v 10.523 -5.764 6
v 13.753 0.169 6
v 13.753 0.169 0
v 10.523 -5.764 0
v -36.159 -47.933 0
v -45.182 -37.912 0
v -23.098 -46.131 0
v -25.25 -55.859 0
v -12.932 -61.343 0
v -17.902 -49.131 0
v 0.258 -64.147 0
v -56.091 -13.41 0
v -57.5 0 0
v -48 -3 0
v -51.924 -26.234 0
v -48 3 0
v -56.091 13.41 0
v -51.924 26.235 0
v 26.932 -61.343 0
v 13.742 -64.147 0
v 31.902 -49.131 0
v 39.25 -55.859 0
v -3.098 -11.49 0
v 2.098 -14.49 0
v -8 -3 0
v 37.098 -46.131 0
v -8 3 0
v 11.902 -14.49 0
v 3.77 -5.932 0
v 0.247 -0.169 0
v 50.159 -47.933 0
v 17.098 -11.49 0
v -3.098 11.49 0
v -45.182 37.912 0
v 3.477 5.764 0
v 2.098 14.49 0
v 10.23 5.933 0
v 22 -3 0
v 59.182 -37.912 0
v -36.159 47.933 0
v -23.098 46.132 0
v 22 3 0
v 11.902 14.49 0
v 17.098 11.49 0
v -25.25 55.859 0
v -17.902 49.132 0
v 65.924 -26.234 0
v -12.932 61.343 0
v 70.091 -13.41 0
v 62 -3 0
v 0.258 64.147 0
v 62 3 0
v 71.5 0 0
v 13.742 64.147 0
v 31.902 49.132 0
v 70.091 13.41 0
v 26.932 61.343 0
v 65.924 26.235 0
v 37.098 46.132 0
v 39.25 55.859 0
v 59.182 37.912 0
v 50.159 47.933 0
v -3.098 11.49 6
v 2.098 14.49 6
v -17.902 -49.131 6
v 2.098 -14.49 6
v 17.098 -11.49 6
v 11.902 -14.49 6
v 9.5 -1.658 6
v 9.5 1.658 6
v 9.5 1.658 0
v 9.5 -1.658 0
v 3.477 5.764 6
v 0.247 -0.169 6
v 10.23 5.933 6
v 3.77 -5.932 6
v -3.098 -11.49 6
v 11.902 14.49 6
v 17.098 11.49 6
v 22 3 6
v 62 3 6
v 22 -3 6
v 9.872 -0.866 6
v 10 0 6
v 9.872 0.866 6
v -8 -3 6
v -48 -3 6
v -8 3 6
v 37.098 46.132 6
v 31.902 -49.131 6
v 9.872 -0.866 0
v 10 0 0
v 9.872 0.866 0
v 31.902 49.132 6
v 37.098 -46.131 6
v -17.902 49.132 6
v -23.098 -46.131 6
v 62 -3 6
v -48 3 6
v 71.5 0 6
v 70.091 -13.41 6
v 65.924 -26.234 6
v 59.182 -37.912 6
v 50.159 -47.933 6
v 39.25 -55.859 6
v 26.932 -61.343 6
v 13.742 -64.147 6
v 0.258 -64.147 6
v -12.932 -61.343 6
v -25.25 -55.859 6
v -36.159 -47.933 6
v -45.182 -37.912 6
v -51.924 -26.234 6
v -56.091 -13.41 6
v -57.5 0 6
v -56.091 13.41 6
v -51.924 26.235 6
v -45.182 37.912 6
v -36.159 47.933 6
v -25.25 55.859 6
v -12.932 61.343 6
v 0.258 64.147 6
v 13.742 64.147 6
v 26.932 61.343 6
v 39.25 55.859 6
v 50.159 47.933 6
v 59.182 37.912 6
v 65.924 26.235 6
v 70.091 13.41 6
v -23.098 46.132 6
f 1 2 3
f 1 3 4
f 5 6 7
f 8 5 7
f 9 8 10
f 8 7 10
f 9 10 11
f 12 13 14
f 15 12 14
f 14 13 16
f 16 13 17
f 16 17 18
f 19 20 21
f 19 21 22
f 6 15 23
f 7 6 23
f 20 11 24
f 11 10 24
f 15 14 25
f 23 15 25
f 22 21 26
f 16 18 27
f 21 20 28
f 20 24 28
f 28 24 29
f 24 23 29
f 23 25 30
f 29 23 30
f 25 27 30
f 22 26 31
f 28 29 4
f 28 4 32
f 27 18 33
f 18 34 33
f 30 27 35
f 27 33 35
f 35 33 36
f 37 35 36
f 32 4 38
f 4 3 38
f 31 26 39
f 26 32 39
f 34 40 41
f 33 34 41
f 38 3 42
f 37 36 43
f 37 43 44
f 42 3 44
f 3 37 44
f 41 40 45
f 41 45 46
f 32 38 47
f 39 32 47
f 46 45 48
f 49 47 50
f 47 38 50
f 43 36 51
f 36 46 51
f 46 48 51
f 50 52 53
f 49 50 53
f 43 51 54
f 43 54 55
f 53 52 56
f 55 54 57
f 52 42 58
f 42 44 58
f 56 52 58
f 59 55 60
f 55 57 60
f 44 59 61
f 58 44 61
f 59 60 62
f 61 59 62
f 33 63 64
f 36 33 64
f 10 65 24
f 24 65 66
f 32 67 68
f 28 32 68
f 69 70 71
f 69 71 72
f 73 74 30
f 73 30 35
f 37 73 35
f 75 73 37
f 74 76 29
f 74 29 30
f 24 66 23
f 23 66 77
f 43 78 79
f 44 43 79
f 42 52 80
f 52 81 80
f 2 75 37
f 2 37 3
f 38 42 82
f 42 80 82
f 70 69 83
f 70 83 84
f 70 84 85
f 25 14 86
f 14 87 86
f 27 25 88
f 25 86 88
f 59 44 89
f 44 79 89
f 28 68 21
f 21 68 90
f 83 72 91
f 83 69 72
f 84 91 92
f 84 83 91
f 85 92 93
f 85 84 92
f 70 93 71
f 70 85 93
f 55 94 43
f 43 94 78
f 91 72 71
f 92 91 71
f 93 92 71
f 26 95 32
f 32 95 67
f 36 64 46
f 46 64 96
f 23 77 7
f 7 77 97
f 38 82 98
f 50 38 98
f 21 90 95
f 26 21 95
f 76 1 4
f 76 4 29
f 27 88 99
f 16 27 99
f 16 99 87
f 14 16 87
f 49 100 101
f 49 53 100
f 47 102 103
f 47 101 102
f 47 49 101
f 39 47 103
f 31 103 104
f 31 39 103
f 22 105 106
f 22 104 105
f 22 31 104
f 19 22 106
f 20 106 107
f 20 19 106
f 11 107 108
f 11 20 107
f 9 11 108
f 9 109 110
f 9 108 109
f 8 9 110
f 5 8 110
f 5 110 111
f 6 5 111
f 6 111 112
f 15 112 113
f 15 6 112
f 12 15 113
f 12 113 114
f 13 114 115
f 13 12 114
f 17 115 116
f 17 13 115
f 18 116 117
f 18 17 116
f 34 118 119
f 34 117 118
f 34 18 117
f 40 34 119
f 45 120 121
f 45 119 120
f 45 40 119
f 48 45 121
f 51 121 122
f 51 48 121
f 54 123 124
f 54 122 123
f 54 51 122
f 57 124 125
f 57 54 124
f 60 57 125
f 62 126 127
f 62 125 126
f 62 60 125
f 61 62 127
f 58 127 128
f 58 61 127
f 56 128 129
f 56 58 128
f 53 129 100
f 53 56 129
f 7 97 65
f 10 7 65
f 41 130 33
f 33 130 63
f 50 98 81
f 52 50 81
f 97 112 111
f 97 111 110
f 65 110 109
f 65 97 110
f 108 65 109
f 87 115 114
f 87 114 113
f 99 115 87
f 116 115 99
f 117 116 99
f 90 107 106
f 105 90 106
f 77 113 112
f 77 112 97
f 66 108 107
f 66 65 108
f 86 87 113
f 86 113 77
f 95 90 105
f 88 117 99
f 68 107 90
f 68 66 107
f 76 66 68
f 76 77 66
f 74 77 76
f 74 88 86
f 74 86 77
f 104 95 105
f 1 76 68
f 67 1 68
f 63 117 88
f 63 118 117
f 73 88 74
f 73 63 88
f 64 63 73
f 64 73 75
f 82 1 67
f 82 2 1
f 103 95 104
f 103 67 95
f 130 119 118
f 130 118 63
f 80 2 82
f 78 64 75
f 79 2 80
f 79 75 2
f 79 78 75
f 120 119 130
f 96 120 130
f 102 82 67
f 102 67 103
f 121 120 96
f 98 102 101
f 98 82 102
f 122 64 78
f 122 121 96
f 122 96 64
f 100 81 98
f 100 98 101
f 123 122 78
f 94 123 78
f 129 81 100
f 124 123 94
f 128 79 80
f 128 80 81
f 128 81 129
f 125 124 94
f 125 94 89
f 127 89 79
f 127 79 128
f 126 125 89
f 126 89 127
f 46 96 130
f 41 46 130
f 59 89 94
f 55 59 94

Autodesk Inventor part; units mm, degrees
ref_plane "YZ Plane" through (0, 0, 0) normal (1, 0, 0) x (0, 1, 0)
ref_plane "XZ Plane" through (0, 0, 0) normal (0, 1, 0) x (-1, 0, 0)
ref_plane "XY Plane" through (0, 0, 0) normal (0, 0, 1) x (1, 0, 0)
sketch "Эскиз1" plane through (0, 0, 0) normal (0, 0, 1) x (1, 0, 0)
  circle A0 centre (7, 0.0001) radius 3 projected
  circle A1 centre (7, 0.0001) radius 64.5
  point P0 (0, 0)
  dimension "d0" = 129
extrude "Выдавливание1" add sketch "Эскиз1" along normal blind 6
sketch "Эскиз2" plane through (7, 0.0001, 6) normal (0, 0, 1) x (1, 0, 0)
  circle A0 centre (0, 0) radius 3 projected
  circle A1 centre (0, 0) radius 3 projected
  line L0 (2.5, 1.6583) -> (2.5, -1.6583)
  point P0 (-7, -0.0001)
  dimension "d3" = 2.5
extrude "Выдавливание2" add sketch "Эскиз2" against normal blind 6 contours A0 L0 picked at (2.5914, -0.3806)
sketch "Эскиз3" plane through (7, 0.0001, 6) normal (0, 0, 1) x (1, 0, 0)
  line L0 (55, 3) -> (15, 3)
  line L1 (15, 3) -> (15, -3)
  line L2 (15, -3) -> (55, -3)
  line L3 (55, -3) -> (55, 3)
  circle A0 centre (0, 0) radius 3 projected
  line L4 (24.9019, 49.1314) -> (4.9019, 14.4904)
  line L5 (4.9019, 14.4904) -> (10.0981, 11.4904)
  line L6 (10.0981, 11.4904) -> (30.0981, 46.1314)
  line L7 (30.0981, 46.1314) -> (24.9019, 49.1314)
  line L8 (-30.0981, 46.1314) -> (-10.0981, 11.4904)
  line L9 (-10.0981, 11.4904) -> (-4.9019, 14.4904)
  line L10 (-4.9019, 14.4904) -> (-24.9019, 49.1314)
  line L11 (-24.9019, 49.1314) -> (-30.0981, 46.1314)
  line L12 (-55, -3) -> (-15, -3)
  line L13 (-15, -3) -> (-15, 3)
  line L14 (-15, 3) -> (-55, 3)
  line L15 (-55, 3) -> (-55, -3)
  line L16 (-24.9019, -49.1314) -> (-4.9019, -14.4904)
  line L17 (-4.9019, -14.4904) -> (-10.0981, -11.4904)
  line L18 (-10.0981, -11.4904) -> (-30.0981, -46.1314)
  line L19 (-30.0981, -46.1314) -> (-24.9019, -49.1314)
  line L20 (30.0981, -46.1314) -> (10.0981, -11.4904)
  line L21 (10.0981, -11.4904) -> (4.9019, -14.4904)
  line L22 (4.9019, -14.4904) -> (24.9019, -49.1314)
  line L23 (24.9019, -49.1314) -> (30.0981, -46.1314)
  point P0 (-7, -0.0001)
  dimension "d6" = 40
  dimension "d7" = 15
  dimension "d8" = 6
  dimension "d9" = 3
  dimension "d12" = 360
extrude "Выдавливание3" cut sketch "Эскиз3" against normal blind 6 contours L3 L2 L1 L0 | L7 L6 L5 L4 | L11 L10 L9 L8 | L15 L14 L13 L12 | L19 L18 L17 L16 | L23 L22 L21 L20
sketch "Эскиз4" plane through (7, 0.0001, 6) normal (0, 0, 1) x (1, 0, 0)
  circle A0 centre (0, 0) radius 3 projected
  line L0 (3.2303, 5.9325) -> (6.7529, 0.1687)
  line L1 (6.7529, 0.1687) -> (3.5226, -5.7638)
  line L2 (3.5226, -5.7638) -> (-3.2303, -5.9325)
  line L3 (-3.2303, -5.9325) -> (-6.7529, -0.1687)
  line L4 (-6.7529, -0.1687) -> (-3.5226, 5.7638)
  line L5 (-3.5226, 5.7638) -> (3.2303, 5.9325)
  point P0 (-7, -0.0001)
  dimension "d16" = 11.7
extrude "Выдавливание4" cut sketch "Эскиз4" against normal blind 6
properties part number "Барабан"
